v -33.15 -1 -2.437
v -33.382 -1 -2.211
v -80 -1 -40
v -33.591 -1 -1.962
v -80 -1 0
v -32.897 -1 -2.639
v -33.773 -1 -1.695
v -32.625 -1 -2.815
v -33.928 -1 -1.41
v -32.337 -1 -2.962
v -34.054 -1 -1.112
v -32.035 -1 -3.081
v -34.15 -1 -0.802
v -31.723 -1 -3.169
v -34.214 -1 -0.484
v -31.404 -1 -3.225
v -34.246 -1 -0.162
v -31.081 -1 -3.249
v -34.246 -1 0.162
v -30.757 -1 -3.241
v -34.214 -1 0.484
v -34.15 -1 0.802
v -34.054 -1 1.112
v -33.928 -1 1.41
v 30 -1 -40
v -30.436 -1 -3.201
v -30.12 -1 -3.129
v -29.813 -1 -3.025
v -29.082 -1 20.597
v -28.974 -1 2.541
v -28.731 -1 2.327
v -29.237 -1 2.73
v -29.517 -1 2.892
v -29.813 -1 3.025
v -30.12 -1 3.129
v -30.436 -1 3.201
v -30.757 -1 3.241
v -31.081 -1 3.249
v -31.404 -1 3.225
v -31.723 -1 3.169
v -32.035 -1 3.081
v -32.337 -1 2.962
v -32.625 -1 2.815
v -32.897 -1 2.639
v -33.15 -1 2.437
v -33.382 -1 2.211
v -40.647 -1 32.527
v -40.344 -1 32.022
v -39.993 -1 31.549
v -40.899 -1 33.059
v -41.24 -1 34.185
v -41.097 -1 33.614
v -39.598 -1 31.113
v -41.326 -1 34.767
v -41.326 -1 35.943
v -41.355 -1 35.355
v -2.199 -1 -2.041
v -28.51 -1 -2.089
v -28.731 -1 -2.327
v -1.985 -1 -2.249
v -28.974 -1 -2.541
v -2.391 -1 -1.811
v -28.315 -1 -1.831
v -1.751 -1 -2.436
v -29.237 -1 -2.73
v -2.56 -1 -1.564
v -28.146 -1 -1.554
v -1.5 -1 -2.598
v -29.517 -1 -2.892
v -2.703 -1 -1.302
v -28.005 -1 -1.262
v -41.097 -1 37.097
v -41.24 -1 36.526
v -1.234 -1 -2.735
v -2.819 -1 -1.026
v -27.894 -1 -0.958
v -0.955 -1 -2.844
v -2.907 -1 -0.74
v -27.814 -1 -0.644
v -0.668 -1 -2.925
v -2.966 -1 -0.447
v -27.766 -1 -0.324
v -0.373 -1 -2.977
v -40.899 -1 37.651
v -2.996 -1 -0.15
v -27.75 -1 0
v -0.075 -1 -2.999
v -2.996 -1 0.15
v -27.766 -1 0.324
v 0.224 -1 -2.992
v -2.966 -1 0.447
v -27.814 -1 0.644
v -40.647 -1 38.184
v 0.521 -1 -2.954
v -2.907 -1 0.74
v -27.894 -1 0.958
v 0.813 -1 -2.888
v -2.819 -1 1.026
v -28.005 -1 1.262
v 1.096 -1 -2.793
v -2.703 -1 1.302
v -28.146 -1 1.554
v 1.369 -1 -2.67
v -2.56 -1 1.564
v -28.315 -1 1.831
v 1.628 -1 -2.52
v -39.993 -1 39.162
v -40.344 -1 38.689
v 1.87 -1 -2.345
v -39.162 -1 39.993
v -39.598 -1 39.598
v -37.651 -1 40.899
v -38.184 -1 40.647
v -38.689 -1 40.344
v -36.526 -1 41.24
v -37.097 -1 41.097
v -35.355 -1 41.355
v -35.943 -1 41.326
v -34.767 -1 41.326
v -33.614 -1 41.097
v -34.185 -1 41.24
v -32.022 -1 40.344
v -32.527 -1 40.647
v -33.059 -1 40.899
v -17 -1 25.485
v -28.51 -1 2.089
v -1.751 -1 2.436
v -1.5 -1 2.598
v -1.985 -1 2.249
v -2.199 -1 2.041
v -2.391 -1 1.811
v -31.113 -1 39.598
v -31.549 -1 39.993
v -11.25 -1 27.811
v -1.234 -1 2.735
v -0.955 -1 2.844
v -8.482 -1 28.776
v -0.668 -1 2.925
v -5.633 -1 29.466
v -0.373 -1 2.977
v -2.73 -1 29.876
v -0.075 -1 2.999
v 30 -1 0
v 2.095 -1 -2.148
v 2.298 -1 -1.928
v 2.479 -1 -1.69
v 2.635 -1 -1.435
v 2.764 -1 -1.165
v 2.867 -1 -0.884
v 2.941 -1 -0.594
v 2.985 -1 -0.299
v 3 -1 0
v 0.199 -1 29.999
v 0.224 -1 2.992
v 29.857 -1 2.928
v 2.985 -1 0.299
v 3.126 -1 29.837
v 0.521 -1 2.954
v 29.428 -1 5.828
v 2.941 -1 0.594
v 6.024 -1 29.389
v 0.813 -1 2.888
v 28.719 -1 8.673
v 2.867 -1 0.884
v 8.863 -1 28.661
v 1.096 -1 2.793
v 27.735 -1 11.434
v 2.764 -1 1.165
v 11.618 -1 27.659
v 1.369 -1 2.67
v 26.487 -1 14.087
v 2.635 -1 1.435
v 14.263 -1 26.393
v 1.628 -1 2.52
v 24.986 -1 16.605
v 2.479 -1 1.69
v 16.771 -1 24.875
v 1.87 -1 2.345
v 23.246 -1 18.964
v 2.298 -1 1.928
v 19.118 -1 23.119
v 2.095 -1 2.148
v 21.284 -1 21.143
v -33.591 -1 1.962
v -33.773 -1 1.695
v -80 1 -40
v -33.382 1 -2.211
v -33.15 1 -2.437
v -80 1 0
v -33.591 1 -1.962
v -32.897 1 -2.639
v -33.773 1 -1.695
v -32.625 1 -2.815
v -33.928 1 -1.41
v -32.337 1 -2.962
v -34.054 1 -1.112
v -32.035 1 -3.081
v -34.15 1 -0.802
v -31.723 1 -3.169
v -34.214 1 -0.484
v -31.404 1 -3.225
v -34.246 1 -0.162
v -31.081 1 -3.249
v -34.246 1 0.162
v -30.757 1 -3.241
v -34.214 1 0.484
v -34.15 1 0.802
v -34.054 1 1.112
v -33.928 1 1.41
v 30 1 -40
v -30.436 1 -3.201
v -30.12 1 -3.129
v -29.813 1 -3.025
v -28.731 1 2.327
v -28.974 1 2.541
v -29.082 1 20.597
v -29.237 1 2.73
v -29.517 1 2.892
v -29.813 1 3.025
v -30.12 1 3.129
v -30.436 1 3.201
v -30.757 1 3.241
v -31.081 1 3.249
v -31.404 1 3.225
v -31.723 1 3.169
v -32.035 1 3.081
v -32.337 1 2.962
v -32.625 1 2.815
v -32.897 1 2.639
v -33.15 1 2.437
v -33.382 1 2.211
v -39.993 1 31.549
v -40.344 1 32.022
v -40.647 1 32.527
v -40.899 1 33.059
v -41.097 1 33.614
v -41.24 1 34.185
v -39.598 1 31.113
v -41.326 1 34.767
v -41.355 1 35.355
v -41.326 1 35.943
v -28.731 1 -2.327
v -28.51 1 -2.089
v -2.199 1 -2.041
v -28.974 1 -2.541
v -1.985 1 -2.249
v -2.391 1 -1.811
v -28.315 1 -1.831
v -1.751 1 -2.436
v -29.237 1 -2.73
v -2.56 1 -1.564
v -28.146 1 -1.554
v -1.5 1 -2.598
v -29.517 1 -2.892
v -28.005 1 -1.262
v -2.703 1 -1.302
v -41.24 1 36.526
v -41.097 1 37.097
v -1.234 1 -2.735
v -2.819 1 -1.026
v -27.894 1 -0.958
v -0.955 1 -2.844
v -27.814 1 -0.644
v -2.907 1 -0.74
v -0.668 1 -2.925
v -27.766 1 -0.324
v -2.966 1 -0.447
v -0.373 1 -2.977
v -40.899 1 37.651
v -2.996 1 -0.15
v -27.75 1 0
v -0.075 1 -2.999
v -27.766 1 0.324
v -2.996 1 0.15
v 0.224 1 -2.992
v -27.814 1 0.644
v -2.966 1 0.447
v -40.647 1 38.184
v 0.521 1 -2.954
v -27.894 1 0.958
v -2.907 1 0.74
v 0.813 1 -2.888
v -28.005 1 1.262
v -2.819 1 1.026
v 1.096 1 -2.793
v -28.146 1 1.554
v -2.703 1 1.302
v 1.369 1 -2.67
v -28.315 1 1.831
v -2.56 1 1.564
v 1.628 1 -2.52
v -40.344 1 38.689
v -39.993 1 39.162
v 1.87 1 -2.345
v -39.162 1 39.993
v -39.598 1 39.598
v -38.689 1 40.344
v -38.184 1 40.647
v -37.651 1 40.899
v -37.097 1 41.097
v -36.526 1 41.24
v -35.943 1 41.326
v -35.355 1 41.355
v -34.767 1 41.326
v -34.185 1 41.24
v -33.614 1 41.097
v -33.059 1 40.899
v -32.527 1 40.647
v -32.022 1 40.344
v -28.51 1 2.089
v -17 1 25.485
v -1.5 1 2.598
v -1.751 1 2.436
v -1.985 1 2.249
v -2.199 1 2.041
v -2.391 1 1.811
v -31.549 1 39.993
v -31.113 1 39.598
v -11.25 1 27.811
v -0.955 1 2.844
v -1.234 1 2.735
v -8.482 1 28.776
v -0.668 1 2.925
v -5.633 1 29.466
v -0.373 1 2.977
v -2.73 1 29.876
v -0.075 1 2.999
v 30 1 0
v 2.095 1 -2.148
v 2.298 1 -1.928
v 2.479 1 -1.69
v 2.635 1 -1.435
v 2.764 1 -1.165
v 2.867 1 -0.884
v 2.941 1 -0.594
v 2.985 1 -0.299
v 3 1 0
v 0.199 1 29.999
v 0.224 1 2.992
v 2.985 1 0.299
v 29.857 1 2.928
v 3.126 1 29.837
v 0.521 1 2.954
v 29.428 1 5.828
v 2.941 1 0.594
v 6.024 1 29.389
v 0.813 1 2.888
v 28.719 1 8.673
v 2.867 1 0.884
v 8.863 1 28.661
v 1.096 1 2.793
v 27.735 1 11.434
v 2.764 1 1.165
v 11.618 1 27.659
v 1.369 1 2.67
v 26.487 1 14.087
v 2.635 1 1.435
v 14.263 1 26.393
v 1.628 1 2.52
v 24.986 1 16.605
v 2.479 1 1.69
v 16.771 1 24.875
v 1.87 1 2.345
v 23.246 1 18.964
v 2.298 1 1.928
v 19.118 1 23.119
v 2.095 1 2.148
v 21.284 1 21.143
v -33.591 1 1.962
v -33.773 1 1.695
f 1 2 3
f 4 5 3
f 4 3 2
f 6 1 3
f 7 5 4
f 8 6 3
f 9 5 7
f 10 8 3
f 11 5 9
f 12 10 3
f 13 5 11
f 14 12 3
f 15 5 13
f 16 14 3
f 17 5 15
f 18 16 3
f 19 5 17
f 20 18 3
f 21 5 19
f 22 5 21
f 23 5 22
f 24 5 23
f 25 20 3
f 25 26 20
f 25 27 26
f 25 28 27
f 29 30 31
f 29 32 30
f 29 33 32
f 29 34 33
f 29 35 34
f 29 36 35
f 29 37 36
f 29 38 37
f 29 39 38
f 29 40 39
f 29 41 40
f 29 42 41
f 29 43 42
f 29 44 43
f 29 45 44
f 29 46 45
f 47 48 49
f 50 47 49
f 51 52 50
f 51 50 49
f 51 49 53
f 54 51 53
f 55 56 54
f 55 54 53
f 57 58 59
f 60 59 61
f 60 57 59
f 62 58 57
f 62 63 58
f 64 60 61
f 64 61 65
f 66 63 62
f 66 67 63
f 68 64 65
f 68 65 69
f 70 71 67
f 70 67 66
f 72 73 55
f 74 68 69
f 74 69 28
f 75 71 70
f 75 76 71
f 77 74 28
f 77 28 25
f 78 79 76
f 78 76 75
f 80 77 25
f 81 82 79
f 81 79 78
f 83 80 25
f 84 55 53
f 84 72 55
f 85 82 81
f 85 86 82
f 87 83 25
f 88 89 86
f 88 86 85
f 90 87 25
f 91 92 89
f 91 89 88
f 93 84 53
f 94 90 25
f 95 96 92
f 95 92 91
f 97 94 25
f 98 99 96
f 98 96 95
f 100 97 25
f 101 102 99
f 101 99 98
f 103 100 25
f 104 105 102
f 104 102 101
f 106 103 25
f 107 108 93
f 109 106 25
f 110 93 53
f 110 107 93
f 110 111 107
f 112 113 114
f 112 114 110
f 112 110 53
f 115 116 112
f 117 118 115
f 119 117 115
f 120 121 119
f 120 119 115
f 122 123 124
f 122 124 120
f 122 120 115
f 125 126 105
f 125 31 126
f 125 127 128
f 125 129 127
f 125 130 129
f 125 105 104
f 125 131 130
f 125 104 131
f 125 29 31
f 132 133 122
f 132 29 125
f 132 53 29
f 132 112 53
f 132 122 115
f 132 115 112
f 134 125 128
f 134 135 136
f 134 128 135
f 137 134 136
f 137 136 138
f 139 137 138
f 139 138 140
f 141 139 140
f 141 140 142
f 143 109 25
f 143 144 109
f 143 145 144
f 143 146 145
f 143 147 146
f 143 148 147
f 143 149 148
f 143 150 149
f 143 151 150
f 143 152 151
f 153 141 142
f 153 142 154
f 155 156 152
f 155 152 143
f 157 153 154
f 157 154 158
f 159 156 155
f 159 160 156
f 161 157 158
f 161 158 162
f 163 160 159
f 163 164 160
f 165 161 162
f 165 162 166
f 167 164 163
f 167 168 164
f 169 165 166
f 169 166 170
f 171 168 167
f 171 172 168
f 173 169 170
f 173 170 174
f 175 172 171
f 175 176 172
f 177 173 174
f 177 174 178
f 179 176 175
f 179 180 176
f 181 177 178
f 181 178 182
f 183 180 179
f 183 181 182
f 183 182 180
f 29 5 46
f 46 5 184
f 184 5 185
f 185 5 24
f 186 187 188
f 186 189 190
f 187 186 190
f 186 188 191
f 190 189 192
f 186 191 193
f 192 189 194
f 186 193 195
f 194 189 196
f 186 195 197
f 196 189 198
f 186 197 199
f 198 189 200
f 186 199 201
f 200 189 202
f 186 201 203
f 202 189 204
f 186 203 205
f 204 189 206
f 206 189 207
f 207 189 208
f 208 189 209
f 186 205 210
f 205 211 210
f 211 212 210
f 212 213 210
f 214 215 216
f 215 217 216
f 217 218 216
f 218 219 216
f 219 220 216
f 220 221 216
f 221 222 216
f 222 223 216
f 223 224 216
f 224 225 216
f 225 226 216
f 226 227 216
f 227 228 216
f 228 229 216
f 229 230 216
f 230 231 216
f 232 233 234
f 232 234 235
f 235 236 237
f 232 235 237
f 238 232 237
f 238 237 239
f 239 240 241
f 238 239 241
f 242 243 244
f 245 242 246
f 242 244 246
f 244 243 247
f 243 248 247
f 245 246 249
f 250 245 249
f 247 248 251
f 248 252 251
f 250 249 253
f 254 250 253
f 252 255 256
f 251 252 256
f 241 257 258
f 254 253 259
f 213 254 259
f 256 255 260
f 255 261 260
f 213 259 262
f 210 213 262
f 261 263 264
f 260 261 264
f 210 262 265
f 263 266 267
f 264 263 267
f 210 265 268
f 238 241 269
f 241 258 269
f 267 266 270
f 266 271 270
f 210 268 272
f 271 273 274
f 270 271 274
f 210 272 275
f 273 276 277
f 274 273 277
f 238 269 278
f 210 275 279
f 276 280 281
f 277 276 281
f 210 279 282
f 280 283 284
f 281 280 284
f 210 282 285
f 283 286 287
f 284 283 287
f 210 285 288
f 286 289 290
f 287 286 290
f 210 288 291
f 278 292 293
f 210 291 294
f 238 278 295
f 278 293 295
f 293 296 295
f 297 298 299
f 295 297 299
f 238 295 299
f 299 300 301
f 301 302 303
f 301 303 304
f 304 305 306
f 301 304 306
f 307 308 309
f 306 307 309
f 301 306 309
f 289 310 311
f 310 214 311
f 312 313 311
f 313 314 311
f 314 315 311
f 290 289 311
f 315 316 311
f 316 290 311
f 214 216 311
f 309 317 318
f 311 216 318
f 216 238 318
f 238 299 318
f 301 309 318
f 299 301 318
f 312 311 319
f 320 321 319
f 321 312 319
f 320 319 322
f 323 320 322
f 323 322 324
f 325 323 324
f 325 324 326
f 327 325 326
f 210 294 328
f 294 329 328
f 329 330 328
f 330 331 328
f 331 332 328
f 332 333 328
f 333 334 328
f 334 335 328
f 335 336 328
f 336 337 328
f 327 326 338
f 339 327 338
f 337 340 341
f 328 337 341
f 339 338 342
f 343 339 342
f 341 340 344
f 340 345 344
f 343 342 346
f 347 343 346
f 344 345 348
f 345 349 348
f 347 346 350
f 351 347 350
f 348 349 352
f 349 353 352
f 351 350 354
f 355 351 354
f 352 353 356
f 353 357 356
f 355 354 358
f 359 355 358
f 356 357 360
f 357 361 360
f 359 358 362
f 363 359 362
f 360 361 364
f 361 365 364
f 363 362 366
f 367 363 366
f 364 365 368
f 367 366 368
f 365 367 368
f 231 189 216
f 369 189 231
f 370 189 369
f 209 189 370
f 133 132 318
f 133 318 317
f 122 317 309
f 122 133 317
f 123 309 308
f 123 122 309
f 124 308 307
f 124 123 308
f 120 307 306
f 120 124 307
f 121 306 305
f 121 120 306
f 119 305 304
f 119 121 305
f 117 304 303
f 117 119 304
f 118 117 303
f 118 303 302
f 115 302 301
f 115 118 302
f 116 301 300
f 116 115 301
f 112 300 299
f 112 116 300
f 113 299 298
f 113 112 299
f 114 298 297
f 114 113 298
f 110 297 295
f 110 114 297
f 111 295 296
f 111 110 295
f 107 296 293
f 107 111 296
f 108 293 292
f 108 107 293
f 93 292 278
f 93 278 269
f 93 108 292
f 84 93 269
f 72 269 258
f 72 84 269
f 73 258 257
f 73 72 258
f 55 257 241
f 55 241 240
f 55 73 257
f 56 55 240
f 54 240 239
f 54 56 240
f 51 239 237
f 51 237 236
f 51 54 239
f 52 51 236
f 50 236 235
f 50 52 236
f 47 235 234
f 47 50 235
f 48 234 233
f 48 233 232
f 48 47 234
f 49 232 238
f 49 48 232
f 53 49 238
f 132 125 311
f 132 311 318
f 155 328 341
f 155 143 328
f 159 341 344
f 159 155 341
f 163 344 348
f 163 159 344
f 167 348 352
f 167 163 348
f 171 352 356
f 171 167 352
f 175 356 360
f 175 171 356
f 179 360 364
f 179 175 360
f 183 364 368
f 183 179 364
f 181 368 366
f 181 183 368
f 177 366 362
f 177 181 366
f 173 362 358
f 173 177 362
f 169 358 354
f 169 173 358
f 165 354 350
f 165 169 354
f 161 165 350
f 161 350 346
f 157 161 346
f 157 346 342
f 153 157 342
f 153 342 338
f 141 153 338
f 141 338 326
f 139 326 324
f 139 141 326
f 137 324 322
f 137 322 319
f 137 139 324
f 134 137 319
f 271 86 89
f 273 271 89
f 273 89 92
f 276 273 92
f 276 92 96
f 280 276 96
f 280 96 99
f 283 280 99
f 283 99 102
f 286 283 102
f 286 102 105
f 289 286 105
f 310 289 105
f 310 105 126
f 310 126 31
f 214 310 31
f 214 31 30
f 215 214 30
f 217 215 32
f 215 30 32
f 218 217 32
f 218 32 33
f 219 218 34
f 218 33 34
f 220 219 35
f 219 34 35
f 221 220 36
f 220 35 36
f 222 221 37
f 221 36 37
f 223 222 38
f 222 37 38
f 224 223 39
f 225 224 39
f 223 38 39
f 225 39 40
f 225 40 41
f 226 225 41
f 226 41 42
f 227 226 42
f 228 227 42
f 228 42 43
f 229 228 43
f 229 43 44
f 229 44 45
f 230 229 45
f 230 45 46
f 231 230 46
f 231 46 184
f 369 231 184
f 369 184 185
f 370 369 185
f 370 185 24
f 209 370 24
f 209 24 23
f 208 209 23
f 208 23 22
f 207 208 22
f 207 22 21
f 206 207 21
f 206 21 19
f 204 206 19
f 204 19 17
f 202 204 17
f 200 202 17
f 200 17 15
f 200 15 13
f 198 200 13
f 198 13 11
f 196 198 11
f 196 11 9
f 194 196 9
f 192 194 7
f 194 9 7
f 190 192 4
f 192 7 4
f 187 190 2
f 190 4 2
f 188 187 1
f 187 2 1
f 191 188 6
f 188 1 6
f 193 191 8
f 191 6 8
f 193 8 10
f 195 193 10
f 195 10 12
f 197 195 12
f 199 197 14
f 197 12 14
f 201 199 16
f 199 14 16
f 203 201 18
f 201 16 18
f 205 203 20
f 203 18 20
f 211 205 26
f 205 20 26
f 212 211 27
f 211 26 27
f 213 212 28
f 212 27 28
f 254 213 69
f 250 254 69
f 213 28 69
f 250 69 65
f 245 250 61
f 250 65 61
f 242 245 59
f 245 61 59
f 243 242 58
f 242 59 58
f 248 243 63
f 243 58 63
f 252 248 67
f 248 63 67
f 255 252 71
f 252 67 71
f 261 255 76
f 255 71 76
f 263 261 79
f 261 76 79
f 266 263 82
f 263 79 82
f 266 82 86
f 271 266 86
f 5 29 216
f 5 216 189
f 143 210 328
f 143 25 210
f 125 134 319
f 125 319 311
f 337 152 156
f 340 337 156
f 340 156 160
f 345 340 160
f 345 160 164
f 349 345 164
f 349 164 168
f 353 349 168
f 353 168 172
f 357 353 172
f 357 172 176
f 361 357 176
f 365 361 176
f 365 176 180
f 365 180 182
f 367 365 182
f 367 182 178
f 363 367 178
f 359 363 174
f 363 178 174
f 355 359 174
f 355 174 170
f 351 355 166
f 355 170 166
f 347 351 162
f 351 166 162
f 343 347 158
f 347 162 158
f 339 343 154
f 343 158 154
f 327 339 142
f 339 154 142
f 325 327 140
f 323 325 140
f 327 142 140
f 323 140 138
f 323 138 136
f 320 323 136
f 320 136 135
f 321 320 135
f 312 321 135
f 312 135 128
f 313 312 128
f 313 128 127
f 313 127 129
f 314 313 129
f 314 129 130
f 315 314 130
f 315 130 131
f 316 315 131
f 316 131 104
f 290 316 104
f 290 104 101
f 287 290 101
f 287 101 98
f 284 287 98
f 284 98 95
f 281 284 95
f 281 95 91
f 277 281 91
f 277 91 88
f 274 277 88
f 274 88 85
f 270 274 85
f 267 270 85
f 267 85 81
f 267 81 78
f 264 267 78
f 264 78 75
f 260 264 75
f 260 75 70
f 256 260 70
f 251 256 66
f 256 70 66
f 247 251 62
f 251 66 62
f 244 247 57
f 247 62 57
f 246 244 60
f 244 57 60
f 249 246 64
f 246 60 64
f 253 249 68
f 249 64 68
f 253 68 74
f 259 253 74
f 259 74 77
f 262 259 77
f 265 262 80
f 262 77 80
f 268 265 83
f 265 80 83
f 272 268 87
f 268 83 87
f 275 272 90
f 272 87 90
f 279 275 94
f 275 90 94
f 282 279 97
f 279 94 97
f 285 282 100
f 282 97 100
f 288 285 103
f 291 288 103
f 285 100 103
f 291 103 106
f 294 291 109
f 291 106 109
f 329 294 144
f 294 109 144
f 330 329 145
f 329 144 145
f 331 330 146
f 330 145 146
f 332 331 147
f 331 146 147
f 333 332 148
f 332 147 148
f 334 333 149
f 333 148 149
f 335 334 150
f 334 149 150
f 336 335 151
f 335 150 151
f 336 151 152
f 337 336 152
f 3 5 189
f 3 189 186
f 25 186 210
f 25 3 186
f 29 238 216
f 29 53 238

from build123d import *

# Parameters (mm, degrees)
F1_DEPTH = 1
F2_R     = 3
F2_R_2   = 3.25
F3_DEPTH = 2.001
F4_DEPTH = 1


with BuildPart() as f1:
    # F0 (on Front) → F1 (new body, symmetric)
    with BuildSketch(Plane.XZ):
        with BuildLine():
            ThreePointArc((30, 0), (16.77051, 24.874686), (-11.25, 27.810744))
            Line((-11.25, 27.810744), (-16.999625, 25.484906))
            Line((-16.999625, 25.484906), (-29.082446, 20.597165))
            Line((-29.082446, 20.597165), (-80, 0))
            Line((-80, 0), (-80, -40))
            Line((-80, -40), (30, -40))
            Line((30, -40), (30, 0))
        make_face()
    extrude(amount=F1_DEPTH, both=True)

    # F2 (on face) → F3 (cut, through all)
    with BuildSketch(Plane.XZ.offset(1)):
        Circle(F2_R)
        with Locations((-31, 0)):
            Circle(F2_R_2)
    extrude(amount=-F3_DEPTH, mode=Mode.SUBTRACT)

    # F0 (on Front) → F4 (join, symmetric)
    with BuildSketch(Plane.XZ):
        with BuildLine():
            Line((-29.082446, 20.597165), (-16.999625, 25.484906))
            Line((-16.999625, 25.484906), (-31.112698, 39.59798))
            ThreePointArc((-31.112698, 39.59798), (-39.59798, 39.59798), (-39.59798, 31.112698))
            Line((-39.59798, 31.112698), (-29.082446, 20.597165))
        make_face()
    extrude(amount=F4_DEPTH, both=True)


solid = f1.part
